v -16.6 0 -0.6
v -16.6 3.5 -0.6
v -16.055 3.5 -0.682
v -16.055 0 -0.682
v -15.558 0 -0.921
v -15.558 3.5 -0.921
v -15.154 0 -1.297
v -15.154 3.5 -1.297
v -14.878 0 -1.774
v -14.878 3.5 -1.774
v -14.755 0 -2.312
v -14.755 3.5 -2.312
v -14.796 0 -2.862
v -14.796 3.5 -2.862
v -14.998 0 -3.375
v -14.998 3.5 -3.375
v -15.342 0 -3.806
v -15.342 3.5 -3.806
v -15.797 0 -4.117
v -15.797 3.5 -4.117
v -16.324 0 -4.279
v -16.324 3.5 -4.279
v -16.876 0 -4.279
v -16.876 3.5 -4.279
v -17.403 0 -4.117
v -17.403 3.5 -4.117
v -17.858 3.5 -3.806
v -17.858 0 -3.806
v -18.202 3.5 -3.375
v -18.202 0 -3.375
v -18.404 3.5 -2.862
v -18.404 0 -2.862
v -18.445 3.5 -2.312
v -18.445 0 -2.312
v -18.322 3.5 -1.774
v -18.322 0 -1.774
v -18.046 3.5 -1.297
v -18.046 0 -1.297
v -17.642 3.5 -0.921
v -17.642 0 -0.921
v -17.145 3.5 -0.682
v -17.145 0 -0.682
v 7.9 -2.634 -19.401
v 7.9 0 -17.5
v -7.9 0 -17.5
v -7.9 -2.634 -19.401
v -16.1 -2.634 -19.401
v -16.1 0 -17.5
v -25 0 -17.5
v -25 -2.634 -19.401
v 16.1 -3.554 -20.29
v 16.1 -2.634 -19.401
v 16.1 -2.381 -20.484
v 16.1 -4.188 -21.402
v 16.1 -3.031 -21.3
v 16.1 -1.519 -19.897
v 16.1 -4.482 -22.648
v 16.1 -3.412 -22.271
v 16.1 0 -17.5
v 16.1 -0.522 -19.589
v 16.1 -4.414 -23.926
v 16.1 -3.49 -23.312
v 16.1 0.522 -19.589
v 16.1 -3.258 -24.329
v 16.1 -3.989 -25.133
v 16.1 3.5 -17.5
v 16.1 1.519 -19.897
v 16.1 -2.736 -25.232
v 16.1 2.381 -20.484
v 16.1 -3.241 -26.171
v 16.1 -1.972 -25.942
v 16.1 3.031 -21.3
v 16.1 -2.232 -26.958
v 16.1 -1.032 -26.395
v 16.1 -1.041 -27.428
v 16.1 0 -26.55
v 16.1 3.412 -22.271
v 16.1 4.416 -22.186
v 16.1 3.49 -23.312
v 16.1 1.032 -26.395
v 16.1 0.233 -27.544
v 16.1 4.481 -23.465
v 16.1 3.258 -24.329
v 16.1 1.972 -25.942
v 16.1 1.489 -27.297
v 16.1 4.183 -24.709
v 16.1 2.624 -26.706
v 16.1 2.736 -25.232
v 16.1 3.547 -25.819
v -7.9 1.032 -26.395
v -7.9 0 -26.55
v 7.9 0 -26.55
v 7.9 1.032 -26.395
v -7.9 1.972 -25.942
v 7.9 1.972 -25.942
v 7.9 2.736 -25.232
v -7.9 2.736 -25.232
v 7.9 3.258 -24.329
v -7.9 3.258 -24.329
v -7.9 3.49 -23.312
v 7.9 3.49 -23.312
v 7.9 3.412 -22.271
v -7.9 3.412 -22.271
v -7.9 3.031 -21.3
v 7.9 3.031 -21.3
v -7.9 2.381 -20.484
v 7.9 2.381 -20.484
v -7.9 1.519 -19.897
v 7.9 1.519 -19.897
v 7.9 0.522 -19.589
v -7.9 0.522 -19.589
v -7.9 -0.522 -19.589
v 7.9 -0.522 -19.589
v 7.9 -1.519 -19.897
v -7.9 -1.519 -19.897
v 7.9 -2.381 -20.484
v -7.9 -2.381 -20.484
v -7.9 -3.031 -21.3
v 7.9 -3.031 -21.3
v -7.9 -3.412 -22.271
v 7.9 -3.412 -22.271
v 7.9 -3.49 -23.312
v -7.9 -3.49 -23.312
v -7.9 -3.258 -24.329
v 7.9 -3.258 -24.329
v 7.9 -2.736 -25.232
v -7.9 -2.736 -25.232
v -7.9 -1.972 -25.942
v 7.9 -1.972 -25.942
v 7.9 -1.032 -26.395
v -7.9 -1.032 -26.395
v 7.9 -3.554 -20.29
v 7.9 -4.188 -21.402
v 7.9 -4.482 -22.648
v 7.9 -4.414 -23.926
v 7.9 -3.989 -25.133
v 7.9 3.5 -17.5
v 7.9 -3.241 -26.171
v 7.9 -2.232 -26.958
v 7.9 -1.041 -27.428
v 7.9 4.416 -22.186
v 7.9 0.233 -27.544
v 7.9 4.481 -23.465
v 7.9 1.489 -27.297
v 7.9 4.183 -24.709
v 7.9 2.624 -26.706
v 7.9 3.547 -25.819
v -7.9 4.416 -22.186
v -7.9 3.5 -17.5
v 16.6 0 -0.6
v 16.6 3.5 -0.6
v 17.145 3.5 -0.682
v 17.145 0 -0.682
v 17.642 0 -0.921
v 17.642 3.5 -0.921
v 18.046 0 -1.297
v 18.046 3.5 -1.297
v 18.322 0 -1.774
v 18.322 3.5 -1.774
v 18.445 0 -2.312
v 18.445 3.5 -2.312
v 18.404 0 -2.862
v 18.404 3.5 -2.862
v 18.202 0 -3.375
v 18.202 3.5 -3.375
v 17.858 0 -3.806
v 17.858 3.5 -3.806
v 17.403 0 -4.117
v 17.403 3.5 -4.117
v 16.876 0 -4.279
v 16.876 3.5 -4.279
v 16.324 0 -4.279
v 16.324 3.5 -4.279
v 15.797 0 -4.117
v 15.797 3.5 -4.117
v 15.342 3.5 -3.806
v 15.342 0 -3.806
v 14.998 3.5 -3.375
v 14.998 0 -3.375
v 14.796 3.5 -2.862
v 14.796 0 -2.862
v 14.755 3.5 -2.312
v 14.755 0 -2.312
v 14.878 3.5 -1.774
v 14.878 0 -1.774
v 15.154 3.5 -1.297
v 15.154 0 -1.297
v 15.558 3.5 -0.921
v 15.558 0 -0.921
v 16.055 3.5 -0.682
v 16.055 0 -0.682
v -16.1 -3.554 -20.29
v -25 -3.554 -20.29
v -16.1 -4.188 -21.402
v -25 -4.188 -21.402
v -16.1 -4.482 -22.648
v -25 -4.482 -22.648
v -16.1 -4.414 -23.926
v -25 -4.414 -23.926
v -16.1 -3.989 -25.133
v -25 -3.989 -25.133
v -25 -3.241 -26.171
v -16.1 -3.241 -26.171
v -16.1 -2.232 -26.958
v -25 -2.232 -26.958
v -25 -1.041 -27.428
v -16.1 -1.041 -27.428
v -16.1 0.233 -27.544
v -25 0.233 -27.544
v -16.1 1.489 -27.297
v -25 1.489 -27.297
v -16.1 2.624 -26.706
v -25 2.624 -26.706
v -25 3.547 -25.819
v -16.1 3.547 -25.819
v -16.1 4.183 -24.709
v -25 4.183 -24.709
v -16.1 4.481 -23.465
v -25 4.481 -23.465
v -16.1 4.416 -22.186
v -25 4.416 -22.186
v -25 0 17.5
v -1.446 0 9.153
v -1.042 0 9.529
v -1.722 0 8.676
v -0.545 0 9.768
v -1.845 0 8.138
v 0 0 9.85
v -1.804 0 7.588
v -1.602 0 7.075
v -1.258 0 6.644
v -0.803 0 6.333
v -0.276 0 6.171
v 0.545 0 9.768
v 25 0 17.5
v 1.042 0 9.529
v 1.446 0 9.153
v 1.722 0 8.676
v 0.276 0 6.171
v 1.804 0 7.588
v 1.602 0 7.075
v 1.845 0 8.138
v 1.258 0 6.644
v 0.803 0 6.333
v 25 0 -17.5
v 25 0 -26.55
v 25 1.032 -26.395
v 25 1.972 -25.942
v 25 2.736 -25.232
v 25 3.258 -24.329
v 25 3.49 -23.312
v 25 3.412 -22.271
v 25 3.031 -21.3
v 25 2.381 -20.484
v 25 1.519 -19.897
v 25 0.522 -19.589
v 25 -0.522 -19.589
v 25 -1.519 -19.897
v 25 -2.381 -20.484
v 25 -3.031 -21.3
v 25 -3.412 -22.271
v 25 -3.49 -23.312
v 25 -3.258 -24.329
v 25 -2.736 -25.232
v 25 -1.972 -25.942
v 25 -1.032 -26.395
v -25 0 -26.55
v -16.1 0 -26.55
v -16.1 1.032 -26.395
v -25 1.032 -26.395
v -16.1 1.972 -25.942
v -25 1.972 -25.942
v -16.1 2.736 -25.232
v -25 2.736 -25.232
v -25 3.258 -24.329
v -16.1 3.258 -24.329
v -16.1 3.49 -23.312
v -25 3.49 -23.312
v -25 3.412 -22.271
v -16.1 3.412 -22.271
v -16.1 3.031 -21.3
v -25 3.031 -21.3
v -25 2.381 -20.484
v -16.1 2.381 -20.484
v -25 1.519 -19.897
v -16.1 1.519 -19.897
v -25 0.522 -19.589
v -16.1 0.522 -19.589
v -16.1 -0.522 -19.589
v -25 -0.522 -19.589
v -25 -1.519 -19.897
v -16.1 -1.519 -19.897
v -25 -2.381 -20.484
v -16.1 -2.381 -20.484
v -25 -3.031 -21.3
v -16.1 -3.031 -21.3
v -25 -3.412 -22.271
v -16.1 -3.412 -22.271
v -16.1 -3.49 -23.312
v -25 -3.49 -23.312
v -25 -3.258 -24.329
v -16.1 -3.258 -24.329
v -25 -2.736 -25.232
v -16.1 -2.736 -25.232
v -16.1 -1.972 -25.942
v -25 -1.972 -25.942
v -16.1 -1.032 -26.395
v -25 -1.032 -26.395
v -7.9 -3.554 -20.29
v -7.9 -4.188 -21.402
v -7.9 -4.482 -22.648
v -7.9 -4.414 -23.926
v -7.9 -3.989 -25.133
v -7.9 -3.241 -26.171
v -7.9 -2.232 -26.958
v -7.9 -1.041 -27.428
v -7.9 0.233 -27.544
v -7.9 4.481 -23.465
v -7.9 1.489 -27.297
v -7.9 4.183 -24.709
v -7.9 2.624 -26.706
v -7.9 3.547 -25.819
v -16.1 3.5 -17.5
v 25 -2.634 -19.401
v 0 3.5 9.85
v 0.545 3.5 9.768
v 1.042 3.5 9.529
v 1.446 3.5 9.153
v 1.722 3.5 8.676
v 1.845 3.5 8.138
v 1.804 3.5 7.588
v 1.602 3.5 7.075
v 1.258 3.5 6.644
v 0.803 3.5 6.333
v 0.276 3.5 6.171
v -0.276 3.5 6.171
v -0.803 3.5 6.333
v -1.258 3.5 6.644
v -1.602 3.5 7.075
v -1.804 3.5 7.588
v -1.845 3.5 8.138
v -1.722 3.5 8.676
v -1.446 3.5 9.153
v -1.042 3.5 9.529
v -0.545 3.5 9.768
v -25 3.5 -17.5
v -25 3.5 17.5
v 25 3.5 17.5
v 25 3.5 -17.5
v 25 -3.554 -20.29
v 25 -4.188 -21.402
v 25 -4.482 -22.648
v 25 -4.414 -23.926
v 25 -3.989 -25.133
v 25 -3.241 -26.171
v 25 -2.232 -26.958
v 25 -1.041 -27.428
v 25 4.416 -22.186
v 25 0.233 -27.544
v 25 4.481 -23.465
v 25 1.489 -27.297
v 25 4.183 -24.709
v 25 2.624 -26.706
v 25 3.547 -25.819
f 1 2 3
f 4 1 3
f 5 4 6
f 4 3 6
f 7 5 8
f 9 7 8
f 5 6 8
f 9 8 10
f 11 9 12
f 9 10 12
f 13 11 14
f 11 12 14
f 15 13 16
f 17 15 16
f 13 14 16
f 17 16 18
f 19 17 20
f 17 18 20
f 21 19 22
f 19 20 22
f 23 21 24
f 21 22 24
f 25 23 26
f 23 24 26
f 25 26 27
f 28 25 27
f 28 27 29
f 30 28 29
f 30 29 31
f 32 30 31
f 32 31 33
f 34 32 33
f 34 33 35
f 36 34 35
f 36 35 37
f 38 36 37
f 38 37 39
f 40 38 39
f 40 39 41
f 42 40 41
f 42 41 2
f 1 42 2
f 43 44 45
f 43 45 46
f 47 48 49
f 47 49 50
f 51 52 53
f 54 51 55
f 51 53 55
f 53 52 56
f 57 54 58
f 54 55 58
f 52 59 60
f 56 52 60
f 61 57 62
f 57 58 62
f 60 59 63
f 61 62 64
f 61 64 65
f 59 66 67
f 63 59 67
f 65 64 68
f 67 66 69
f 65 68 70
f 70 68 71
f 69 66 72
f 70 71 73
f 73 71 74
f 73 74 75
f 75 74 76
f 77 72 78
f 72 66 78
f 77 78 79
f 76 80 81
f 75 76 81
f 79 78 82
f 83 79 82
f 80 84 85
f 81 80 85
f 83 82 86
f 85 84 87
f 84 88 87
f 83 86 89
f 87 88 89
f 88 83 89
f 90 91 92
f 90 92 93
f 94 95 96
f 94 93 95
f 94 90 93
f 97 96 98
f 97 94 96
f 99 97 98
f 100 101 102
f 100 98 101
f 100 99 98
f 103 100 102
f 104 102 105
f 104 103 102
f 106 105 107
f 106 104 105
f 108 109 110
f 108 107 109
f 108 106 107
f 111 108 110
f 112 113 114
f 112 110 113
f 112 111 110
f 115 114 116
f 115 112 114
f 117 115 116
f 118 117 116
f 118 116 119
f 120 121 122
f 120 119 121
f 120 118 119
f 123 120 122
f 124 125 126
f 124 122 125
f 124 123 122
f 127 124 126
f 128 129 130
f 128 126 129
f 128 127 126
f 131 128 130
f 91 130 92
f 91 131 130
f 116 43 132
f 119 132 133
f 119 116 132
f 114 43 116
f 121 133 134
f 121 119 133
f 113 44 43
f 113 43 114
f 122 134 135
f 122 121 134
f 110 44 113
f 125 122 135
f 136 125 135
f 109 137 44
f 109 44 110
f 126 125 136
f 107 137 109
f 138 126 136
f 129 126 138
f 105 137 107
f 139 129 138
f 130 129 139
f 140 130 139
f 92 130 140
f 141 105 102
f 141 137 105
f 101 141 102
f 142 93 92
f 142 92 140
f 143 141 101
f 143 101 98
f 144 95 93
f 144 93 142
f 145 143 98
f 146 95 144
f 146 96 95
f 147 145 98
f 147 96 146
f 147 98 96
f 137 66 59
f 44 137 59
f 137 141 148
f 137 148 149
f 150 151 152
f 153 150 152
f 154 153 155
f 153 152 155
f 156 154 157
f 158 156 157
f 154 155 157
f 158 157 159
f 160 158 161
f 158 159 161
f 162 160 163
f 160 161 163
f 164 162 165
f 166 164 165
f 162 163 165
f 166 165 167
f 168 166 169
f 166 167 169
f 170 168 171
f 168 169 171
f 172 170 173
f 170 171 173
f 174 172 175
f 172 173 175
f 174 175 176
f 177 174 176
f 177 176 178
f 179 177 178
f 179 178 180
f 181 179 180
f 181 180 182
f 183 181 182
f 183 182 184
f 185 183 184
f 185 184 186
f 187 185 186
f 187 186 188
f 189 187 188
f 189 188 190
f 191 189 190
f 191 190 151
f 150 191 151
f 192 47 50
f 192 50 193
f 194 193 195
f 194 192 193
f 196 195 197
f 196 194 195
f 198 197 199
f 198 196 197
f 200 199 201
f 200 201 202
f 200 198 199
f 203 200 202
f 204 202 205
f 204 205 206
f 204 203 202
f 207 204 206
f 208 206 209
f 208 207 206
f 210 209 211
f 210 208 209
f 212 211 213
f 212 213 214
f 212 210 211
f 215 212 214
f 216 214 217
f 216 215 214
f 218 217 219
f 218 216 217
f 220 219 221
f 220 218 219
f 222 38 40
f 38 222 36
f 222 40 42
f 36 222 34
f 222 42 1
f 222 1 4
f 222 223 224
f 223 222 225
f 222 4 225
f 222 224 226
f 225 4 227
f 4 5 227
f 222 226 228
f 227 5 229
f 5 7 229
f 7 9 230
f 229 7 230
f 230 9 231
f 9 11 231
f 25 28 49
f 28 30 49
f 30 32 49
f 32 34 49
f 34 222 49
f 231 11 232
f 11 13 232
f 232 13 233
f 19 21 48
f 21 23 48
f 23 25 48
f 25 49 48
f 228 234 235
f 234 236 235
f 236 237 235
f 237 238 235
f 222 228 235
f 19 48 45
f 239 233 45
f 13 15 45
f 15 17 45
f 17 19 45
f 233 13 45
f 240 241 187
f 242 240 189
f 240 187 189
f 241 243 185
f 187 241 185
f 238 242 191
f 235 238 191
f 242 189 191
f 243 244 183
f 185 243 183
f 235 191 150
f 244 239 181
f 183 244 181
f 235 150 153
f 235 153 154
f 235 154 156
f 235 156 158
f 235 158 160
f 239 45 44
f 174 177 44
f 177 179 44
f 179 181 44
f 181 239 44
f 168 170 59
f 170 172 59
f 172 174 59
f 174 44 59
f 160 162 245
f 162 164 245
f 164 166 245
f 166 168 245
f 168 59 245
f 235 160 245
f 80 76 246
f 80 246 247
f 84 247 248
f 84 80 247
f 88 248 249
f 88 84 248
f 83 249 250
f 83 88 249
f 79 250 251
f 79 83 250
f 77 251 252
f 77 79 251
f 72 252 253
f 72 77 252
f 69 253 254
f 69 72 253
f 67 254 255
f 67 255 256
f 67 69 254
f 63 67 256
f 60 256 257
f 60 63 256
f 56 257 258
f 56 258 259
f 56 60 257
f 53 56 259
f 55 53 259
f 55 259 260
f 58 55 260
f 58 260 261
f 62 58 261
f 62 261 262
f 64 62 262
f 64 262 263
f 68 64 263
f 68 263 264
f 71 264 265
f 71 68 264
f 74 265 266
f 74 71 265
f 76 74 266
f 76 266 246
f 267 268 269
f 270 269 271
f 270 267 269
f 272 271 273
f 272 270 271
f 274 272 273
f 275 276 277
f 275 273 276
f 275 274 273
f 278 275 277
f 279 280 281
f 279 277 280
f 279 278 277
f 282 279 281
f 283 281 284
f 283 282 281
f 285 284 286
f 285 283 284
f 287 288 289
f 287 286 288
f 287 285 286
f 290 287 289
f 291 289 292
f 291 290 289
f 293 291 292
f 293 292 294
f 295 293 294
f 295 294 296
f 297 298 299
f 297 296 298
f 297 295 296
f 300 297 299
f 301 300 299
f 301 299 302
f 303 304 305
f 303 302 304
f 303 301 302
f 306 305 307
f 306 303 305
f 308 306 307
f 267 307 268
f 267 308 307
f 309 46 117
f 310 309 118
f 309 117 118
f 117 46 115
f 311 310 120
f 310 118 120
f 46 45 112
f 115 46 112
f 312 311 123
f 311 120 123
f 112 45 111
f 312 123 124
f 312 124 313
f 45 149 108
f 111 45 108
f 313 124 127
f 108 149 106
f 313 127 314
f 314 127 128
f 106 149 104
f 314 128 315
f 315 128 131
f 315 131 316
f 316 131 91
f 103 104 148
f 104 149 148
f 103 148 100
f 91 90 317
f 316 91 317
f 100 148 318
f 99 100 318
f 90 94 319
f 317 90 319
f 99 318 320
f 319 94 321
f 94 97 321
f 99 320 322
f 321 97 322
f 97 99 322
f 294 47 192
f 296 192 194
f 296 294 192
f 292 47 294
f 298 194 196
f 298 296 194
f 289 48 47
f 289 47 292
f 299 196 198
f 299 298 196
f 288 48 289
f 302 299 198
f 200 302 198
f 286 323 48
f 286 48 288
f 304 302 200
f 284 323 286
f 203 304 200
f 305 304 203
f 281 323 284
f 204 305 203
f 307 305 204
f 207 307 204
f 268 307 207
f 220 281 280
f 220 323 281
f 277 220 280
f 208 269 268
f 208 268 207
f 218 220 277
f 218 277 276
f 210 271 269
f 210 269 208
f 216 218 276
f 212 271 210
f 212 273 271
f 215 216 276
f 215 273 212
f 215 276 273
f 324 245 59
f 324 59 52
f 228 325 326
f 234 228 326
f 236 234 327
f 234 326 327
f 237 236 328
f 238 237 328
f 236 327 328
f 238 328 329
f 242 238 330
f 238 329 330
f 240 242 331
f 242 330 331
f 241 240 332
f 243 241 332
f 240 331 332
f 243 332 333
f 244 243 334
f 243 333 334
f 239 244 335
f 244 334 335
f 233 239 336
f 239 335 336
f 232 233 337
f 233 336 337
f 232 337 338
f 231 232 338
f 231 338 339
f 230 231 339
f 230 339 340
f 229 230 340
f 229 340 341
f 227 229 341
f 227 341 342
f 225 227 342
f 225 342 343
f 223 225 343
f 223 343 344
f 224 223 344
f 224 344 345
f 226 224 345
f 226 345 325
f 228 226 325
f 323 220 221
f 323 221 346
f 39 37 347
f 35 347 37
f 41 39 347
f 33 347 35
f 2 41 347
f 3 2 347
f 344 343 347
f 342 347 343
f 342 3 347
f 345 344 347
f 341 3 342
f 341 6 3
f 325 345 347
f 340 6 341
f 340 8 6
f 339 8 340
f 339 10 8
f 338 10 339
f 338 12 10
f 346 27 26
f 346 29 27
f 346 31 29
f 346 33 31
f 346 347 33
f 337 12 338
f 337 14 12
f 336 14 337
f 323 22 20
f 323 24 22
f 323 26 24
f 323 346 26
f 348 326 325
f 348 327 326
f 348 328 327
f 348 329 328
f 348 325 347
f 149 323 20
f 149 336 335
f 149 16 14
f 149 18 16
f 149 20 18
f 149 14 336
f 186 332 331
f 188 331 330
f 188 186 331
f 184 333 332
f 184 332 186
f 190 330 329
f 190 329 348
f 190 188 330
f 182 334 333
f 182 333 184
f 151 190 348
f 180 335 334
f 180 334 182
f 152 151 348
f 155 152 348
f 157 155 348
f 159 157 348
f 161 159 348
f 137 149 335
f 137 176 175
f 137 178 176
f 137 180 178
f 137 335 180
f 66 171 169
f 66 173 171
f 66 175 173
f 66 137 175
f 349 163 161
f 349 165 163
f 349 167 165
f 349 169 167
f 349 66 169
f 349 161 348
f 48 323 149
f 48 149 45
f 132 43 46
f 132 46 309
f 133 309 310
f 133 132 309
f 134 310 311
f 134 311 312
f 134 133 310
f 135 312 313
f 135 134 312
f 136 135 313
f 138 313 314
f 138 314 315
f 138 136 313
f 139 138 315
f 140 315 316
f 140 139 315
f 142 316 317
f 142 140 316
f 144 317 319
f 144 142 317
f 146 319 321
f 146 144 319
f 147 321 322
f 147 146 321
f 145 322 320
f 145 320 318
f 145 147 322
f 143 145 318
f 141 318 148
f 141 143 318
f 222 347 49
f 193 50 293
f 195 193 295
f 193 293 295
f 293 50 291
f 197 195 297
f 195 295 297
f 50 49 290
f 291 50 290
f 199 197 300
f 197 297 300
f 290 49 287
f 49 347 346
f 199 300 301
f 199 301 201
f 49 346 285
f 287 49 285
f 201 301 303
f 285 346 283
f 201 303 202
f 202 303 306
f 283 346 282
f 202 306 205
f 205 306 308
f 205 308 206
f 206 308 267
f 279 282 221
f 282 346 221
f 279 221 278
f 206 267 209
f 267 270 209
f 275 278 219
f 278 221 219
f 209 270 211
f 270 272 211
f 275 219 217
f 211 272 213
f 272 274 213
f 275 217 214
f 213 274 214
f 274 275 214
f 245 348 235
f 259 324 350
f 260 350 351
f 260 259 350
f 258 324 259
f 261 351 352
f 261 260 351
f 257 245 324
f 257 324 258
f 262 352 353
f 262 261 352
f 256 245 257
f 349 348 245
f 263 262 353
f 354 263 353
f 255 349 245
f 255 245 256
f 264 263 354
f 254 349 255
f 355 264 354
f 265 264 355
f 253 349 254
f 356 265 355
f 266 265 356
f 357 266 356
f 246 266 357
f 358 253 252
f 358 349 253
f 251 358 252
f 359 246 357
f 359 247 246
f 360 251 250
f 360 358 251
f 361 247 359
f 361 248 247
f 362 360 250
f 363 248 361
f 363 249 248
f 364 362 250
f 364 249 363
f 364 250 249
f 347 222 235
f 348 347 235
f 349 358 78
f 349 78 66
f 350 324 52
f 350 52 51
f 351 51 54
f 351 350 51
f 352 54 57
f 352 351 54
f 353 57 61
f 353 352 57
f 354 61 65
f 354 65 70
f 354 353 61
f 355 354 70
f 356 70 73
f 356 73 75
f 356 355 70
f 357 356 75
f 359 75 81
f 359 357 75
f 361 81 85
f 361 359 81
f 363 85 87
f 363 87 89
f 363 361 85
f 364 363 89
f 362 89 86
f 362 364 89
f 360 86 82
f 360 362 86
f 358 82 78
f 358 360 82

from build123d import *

# Parameters (mm, degrees)
SKETCH1_W           = 50
SKETCH1_H           = 35
BOSS_EXTRUDE1_DEPTH = 3.5
SKETCH2_R           = 1.85
CUT_EXTRUDE1_DEPTH  = 31.716445107
SKETCH3_R           = 3.5
BOSS_EXTRUDE2_DEPTH = 25
CUT_EXTRUDE2_START  = 8.2
CUT_EXTRUDE2_DEPTH  = 8.2


with BuildPart() as part:
    # Sketch1 → Boss-Extrude1 (new body)
    with BuildSketch(Plane(origin=(0, 0, 0), x_dir=(1, 0, 0), z_dir=(0, 1, 0))):
        Rectangle(SKETCH1_W, SKETCH1_H)
    extrude(amount=BOSS_EXTRUDE1_DEPTH)

    # Sketch2 → Cut-Extrude1 (cut, through all)
    with BuildSketch(Plane(origin=(0, 3.5, 0), x_dir=(1, 0, 0), z_dir=(0, 1, 0))):
        with Locations(Location((0, -8, 0), (0, 0, 270))):
            Circle(SKETCH2_R)
        with Locations(Location((16.6, 2.45, 0), (0, 0, 270))):
            Circle(SKETCH2_R)
        with Locations(Location((-16.6, 2.45, 0), (0, 0, 270))):
            Circle(SKETCH2_R)
    extrude(amount=-CUT_EXTRUDE1_DEPTH, mode=Mode.SUBTRACT)

    # Sketch3 → Boss-Extrude2 (add, symmetric)
    with BuildSketch(Plane(origin=(0, 0, 0), x_dir=(0, 0, -1), z_dir=(1, 0, 0))):
        with BuildLine():
            Line((17.5, 0), (19.401351351, -2.633887439))
            ThreePointArc((19.401351351, -2.633887439), (27.235272499, -1.653328191), (22.186446019, 4.416364401))
            Line((22.186446019, 4.416364401), (17.5, 3.5))
            Line((17.5, 3.5), (17.5, 1.655278421))
            Line((17.5, 1.655278421), (17.5, 0))
        make_face()
        with Locations((23.05, 0)):
            Circle(SKETCH3_R, mode=Mode.SUBTRACT)
    extrude(amount=BOSS_EXTRUDE2_DEPTH, both=True)

    # Sketch4 → Cut-Extrude2 (cut)
    with BuildSketch(Plane(origin=(7.9, 0, 0), x_dir=(0, 0, -1), z_dir=(1, 0, 0)).offset(CUT_EXTRUDE2_START)):
        with BuildLine():
            Line((17.5, 3.5), (17.5, 0))
            Line((17.5, 0), (19.401351351, -2.633887439))
            ThreePointArc((19.401351351, -2.633887439), (27.235272499, -1.653328191), (22.186446019, 4.416364401))
            Line((22.186446019, 4.416364401), (17.5, 3.5))
        make_face()
    cut_extrude2 = extrude(amount=-CUT_EXTRUDE2_DEPTH, mode=Mode.SUBTRACT)

    # Mirror1: Cut-Extrude2 across plane
    add(cut_extrude2.mirror(Plane(origin=(0, 0, 0), x_dir=(0, 0, 1), z_dir=(1, 0, 0))), mode=Mode.SUBTRACT)


solid = part.part
